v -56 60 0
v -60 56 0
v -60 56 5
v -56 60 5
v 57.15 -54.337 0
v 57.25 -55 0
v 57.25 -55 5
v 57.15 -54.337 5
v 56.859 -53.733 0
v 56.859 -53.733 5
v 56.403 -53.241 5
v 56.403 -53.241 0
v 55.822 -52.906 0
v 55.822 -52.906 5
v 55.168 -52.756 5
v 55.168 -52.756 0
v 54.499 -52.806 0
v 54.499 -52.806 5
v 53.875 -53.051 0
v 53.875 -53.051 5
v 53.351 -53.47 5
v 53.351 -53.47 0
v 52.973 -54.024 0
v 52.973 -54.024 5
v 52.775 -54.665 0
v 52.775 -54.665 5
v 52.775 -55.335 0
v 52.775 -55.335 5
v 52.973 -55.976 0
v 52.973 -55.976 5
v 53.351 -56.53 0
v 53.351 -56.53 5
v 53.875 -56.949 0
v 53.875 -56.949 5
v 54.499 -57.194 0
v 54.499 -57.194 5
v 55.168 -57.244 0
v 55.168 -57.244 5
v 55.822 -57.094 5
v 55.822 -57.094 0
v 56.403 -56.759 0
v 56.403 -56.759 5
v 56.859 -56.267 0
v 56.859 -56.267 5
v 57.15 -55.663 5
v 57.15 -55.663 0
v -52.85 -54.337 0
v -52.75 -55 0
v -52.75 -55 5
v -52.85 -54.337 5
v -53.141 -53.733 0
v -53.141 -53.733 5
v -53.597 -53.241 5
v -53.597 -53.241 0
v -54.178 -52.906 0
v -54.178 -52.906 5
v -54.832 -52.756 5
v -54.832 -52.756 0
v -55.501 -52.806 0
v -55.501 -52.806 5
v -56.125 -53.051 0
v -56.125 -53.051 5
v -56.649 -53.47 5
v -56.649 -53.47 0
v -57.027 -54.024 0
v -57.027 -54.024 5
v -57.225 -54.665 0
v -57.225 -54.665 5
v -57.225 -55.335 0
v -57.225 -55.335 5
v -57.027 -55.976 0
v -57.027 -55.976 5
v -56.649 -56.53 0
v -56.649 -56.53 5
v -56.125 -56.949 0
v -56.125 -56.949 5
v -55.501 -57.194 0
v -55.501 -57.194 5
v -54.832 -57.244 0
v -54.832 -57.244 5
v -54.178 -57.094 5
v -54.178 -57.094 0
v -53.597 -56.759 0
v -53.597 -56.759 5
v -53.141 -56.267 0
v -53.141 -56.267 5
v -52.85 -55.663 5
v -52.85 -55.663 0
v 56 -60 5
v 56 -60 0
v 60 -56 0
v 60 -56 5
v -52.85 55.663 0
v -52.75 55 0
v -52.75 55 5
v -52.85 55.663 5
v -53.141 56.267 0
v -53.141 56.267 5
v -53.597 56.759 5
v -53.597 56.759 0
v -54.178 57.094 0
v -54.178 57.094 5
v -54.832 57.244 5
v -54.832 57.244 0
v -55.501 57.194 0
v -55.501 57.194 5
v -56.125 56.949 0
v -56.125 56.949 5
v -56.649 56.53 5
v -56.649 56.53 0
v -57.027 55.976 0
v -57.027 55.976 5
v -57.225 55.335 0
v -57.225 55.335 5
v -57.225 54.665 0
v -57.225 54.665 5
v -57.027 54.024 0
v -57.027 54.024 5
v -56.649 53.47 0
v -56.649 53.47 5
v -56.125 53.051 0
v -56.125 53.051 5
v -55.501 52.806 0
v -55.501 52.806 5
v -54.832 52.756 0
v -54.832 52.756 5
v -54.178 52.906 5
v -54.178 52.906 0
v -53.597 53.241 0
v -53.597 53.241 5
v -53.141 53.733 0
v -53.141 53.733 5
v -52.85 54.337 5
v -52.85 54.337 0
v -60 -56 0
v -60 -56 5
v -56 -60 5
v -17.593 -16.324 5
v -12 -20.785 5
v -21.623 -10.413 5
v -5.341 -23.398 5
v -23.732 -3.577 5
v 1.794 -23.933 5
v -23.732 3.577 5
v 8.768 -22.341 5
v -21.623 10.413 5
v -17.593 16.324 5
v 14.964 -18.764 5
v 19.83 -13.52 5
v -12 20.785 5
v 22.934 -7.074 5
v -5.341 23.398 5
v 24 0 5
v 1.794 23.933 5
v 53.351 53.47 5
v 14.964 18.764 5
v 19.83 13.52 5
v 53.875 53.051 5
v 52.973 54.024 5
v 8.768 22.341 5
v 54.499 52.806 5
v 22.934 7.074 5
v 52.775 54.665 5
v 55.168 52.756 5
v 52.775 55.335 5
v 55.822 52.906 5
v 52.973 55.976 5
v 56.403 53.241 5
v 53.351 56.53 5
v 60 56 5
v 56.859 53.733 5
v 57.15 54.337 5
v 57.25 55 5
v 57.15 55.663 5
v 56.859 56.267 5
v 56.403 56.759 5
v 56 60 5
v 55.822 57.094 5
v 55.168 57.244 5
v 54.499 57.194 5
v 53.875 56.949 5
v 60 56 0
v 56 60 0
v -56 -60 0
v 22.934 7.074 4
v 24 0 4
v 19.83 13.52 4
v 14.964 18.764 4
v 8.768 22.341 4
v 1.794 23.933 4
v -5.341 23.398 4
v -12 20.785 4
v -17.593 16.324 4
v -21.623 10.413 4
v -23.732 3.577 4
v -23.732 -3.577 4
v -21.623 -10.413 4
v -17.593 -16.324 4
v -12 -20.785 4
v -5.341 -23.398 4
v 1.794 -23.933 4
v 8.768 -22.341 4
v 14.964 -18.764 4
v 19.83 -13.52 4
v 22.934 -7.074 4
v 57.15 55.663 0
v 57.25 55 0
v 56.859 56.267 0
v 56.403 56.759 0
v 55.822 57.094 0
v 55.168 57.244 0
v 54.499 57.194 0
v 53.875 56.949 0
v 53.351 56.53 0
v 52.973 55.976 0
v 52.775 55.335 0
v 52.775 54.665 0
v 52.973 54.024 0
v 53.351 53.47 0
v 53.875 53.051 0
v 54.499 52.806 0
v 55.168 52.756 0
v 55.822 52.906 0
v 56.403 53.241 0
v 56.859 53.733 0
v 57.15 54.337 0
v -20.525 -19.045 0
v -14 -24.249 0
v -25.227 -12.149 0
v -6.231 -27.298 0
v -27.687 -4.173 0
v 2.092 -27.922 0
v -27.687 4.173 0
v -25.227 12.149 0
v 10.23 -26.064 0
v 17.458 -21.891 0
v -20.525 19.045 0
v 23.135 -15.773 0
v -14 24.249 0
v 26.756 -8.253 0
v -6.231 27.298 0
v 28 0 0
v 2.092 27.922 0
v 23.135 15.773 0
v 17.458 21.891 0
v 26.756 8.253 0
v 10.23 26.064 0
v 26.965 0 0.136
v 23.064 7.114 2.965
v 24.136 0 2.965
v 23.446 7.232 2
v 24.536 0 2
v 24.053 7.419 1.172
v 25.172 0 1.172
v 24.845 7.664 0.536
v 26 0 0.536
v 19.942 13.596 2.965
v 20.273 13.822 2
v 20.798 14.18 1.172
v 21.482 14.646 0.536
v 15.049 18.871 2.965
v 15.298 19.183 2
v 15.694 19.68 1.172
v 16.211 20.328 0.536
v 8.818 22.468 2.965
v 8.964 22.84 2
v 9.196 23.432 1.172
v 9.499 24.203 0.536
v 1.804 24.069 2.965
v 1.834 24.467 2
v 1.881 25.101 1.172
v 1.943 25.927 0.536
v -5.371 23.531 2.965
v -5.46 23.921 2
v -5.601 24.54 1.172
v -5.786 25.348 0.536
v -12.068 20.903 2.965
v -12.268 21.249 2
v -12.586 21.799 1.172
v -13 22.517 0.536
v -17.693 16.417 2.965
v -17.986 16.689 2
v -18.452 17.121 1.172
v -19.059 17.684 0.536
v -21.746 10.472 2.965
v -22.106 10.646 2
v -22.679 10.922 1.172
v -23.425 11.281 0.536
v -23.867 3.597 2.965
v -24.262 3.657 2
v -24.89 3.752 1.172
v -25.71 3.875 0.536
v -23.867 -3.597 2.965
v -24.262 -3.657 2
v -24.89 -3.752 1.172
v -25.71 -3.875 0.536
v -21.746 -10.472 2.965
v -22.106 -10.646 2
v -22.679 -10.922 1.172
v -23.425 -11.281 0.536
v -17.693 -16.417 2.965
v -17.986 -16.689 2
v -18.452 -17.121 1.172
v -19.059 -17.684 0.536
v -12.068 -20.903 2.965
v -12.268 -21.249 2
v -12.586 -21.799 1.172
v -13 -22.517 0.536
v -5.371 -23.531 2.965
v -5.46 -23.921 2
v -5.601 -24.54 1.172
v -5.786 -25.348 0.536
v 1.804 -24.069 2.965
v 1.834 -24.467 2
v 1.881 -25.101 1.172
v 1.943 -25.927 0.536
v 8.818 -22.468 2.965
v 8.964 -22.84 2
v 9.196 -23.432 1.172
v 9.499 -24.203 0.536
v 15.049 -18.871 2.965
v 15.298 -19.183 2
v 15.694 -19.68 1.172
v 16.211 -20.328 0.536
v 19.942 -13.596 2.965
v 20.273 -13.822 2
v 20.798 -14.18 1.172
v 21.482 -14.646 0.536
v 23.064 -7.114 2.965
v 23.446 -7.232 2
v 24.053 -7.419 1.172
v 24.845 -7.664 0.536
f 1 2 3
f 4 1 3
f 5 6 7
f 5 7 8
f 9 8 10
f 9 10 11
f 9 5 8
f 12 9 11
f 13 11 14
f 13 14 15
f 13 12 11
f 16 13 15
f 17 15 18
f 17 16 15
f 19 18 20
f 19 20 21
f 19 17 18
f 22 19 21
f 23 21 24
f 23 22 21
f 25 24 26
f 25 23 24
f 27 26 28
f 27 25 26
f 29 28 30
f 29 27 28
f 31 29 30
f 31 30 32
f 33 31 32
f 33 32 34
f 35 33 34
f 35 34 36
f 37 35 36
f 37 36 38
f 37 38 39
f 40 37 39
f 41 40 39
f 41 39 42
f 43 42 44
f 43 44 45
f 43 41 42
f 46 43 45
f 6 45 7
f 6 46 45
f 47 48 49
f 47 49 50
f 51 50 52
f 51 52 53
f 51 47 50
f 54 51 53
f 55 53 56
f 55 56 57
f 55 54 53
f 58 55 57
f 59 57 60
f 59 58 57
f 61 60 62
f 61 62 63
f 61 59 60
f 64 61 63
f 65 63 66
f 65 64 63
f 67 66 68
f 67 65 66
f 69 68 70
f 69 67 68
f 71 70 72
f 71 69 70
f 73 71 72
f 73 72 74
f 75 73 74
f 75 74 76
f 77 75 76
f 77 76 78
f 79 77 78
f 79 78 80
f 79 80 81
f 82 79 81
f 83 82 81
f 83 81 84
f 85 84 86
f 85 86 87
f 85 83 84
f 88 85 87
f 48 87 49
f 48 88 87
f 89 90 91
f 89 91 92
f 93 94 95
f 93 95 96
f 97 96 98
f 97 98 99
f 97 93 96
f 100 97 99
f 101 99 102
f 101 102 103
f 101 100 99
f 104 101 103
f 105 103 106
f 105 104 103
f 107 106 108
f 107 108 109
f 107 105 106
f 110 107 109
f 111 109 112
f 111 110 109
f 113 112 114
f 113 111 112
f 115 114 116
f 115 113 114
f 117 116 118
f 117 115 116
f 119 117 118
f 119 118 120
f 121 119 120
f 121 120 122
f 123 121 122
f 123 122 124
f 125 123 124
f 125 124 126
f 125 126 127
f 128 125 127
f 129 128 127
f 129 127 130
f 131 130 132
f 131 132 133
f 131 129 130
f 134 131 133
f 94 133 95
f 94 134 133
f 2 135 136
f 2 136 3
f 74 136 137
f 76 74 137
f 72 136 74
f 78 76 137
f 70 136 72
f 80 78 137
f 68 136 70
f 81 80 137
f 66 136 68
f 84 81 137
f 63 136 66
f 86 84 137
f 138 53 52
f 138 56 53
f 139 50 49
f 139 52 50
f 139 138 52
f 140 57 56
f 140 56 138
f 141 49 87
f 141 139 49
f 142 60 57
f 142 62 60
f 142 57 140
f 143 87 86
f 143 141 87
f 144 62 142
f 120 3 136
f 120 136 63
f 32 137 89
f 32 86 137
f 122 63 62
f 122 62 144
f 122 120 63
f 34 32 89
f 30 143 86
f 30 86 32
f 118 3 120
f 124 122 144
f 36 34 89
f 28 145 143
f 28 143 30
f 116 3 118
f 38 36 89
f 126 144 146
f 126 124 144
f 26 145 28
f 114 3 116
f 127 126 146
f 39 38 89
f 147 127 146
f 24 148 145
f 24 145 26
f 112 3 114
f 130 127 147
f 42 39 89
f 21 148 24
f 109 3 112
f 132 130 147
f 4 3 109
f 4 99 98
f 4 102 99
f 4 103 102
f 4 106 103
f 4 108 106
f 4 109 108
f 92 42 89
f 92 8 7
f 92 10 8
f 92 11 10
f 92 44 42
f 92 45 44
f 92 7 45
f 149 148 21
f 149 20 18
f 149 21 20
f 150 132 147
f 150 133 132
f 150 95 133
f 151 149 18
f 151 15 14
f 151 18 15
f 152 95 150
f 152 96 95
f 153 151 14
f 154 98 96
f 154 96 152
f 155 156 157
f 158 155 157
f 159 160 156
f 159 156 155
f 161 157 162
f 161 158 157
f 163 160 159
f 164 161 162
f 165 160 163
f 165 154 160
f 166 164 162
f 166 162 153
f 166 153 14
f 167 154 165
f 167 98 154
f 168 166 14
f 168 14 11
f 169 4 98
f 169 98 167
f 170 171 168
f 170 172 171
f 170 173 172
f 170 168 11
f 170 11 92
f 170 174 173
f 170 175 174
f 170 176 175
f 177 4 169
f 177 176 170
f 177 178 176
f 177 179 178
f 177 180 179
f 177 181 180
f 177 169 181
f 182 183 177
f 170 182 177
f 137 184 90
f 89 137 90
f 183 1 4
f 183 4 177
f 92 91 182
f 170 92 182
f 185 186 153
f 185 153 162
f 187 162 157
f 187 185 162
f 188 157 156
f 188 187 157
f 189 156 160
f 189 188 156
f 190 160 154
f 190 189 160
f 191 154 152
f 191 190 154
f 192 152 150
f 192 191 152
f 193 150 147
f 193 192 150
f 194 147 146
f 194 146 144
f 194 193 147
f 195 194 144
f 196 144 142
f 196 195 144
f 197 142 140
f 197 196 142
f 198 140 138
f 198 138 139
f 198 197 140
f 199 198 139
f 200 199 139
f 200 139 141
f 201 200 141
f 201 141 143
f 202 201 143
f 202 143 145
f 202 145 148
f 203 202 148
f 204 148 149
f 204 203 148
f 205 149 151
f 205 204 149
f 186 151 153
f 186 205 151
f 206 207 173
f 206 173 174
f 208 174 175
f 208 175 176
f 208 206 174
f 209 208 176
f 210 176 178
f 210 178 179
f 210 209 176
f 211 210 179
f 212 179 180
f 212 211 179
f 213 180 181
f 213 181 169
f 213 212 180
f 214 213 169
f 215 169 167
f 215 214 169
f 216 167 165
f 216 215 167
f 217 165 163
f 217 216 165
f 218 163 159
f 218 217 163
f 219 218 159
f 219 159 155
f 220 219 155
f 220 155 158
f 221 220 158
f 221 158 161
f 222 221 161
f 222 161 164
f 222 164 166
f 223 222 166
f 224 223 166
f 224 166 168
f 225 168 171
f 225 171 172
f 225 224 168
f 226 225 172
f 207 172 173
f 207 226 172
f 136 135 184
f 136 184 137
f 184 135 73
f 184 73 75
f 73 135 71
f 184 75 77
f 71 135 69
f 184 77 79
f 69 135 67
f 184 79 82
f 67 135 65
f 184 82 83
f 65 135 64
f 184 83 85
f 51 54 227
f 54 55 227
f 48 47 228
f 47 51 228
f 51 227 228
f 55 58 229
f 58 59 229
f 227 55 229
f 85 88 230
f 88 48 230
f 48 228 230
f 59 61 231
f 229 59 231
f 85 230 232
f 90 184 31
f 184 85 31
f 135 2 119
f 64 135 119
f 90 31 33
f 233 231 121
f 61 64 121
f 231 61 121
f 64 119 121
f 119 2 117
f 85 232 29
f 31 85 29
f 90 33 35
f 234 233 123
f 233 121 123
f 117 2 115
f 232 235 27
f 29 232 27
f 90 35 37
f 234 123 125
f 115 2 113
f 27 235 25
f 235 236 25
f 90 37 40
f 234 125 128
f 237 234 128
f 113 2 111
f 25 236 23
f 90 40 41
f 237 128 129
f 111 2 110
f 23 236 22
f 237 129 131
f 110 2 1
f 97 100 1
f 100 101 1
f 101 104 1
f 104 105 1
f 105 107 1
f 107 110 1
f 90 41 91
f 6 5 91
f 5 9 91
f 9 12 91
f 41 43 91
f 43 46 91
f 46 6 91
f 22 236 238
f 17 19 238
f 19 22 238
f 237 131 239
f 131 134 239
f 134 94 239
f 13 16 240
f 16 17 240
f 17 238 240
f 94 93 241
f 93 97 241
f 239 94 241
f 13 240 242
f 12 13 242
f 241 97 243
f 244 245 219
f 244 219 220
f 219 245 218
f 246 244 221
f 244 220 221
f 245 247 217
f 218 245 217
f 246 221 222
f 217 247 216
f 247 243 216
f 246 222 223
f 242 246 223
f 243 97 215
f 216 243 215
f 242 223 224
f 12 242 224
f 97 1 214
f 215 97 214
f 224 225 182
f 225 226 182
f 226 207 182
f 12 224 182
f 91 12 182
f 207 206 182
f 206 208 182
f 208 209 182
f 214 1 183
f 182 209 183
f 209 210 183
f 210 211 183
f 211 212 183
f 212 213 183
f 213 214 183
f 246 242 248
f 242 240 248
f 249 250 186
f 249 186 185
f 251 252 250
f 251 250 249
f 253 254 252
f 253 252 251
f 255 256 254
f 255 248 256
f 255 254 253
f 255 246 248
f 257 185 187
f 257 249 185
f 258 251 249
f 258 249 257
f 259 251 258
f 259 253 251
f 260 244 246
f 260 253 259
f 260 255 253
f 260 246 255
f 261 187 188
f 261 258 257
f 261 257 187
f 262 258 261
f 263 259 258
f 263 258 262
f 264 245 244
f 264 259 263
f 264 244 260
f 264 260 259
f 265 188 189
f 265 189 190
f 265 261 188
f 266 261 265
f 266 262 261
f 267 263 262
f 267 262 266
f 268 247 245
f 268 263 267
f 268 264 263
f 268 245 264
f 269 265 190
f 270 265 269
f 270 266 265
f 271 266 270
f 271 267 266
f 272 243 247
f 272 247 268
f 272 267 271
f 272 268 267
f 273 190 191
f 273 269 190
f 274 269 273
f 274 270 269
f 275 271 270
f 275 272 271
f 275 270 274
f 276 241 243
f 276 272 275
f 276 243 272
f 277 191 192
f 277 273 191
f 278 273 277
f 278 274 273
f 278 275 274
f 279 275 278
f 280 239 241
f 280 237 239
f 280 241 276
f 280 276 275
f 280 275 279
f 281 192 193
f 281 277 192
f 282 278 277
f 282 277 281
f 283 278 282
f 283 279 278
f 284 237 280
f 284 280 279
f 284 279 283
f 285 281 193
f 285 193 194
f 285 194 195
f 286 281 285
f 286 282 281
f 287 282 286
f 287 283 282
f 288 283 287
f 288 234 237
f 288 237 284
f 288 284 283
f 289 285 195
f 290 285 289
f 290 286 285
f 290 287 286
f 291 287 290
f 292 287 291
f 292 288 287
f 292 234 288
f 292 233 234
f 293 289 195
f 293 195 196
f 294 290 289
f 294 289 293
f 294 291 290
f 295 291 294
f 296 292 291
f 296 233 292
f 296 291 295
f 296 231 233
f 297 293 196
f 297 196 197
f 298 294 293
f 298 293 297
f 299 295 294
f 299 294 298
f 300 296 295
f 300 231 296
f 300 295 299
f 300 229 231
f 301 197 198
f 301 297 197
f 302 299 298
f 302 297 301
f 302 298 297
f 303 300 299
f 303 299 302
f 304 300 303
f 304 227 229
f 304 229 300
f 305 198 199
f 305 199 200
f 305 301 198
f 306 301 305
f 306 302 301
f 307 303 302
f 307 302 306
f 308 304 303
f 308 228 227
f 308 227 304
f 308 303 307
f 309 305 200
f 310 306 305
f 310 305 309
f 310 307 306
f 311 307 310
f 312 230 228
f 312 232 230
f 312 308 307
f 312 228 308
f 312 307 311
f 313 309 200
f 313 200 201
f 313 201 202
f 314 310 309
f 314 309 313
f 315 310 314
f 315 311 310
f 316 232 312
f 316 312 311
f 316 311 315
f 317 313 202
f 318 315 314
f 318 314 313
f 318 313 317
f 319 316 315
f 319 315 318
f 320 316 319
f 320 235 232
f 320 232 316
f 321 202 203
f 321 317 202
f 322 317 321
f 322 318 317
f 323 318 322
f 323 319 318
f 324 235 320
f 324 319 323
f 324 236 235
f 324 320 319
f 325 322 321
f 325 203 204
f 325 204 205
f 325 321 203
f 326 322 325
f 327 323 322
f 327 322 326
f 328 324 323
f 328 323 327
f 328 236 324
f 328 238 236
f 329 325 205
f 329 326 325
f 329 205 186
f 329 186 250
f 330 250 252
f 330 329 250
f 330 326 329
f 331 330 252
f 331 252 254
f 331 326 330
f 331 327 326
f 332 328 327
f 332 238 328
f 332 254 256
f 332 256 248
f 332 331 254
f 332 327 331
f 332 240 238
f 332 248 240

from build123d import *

# Parameters (mm, degrees)
SKETCH_W     = 120
SKETCH_H     = 120
SKETCH_R     = 2.25
SKETCH_R_2   = 24
PAD_DEPTH    = 5
FILLET_R     = 4
CHAMFER_SIZE = 4


with BuildPart() as part:
    # Sketch → Pad (new body)
    with BuildSketch(Plane.XY):
        Rectangle(SKETCH_W, SKETCH_H)
        with Locations((-55, 55)):
            Circle(SKETCH_R, mode=Mode.SUBTRACT)
        with Locations((55, 55)):
            Circle(SKETCH_R, mode=Mode.SUBTRACT)
        with Locations((55, -55)):
            Circle(SKETCH_R, mode=Mode.SUBTRACT)
        with Locations((-55, -55)):
            Circle(SKETCH_R, mode=Mode.SUBTRACT)
        Circle(SKETCH_R_2, mode=Mode.SUBTRACT)
    extrude(amount=PAD_DEPTH)

    # Fillet
    fillet_edges = [part.edges().sort_by_distance(p)[0] for p in [
        (-24, 0, 0),
    ]]
    fillet(fillet_edges, radius=FILLET_R)

    # Chamfer
    chamfer_edges = [part.edges().sort_by_distance(p)[0] for p in [
        (-60, -60, 2.5),
        (60, -60, 2.5),
        (60, 60, 2.5),
        (-60, 60, 2.5),
    ]]
    chamfer(chamfer_edges, length=CHAMFER_SIZE)


solid = part.part
